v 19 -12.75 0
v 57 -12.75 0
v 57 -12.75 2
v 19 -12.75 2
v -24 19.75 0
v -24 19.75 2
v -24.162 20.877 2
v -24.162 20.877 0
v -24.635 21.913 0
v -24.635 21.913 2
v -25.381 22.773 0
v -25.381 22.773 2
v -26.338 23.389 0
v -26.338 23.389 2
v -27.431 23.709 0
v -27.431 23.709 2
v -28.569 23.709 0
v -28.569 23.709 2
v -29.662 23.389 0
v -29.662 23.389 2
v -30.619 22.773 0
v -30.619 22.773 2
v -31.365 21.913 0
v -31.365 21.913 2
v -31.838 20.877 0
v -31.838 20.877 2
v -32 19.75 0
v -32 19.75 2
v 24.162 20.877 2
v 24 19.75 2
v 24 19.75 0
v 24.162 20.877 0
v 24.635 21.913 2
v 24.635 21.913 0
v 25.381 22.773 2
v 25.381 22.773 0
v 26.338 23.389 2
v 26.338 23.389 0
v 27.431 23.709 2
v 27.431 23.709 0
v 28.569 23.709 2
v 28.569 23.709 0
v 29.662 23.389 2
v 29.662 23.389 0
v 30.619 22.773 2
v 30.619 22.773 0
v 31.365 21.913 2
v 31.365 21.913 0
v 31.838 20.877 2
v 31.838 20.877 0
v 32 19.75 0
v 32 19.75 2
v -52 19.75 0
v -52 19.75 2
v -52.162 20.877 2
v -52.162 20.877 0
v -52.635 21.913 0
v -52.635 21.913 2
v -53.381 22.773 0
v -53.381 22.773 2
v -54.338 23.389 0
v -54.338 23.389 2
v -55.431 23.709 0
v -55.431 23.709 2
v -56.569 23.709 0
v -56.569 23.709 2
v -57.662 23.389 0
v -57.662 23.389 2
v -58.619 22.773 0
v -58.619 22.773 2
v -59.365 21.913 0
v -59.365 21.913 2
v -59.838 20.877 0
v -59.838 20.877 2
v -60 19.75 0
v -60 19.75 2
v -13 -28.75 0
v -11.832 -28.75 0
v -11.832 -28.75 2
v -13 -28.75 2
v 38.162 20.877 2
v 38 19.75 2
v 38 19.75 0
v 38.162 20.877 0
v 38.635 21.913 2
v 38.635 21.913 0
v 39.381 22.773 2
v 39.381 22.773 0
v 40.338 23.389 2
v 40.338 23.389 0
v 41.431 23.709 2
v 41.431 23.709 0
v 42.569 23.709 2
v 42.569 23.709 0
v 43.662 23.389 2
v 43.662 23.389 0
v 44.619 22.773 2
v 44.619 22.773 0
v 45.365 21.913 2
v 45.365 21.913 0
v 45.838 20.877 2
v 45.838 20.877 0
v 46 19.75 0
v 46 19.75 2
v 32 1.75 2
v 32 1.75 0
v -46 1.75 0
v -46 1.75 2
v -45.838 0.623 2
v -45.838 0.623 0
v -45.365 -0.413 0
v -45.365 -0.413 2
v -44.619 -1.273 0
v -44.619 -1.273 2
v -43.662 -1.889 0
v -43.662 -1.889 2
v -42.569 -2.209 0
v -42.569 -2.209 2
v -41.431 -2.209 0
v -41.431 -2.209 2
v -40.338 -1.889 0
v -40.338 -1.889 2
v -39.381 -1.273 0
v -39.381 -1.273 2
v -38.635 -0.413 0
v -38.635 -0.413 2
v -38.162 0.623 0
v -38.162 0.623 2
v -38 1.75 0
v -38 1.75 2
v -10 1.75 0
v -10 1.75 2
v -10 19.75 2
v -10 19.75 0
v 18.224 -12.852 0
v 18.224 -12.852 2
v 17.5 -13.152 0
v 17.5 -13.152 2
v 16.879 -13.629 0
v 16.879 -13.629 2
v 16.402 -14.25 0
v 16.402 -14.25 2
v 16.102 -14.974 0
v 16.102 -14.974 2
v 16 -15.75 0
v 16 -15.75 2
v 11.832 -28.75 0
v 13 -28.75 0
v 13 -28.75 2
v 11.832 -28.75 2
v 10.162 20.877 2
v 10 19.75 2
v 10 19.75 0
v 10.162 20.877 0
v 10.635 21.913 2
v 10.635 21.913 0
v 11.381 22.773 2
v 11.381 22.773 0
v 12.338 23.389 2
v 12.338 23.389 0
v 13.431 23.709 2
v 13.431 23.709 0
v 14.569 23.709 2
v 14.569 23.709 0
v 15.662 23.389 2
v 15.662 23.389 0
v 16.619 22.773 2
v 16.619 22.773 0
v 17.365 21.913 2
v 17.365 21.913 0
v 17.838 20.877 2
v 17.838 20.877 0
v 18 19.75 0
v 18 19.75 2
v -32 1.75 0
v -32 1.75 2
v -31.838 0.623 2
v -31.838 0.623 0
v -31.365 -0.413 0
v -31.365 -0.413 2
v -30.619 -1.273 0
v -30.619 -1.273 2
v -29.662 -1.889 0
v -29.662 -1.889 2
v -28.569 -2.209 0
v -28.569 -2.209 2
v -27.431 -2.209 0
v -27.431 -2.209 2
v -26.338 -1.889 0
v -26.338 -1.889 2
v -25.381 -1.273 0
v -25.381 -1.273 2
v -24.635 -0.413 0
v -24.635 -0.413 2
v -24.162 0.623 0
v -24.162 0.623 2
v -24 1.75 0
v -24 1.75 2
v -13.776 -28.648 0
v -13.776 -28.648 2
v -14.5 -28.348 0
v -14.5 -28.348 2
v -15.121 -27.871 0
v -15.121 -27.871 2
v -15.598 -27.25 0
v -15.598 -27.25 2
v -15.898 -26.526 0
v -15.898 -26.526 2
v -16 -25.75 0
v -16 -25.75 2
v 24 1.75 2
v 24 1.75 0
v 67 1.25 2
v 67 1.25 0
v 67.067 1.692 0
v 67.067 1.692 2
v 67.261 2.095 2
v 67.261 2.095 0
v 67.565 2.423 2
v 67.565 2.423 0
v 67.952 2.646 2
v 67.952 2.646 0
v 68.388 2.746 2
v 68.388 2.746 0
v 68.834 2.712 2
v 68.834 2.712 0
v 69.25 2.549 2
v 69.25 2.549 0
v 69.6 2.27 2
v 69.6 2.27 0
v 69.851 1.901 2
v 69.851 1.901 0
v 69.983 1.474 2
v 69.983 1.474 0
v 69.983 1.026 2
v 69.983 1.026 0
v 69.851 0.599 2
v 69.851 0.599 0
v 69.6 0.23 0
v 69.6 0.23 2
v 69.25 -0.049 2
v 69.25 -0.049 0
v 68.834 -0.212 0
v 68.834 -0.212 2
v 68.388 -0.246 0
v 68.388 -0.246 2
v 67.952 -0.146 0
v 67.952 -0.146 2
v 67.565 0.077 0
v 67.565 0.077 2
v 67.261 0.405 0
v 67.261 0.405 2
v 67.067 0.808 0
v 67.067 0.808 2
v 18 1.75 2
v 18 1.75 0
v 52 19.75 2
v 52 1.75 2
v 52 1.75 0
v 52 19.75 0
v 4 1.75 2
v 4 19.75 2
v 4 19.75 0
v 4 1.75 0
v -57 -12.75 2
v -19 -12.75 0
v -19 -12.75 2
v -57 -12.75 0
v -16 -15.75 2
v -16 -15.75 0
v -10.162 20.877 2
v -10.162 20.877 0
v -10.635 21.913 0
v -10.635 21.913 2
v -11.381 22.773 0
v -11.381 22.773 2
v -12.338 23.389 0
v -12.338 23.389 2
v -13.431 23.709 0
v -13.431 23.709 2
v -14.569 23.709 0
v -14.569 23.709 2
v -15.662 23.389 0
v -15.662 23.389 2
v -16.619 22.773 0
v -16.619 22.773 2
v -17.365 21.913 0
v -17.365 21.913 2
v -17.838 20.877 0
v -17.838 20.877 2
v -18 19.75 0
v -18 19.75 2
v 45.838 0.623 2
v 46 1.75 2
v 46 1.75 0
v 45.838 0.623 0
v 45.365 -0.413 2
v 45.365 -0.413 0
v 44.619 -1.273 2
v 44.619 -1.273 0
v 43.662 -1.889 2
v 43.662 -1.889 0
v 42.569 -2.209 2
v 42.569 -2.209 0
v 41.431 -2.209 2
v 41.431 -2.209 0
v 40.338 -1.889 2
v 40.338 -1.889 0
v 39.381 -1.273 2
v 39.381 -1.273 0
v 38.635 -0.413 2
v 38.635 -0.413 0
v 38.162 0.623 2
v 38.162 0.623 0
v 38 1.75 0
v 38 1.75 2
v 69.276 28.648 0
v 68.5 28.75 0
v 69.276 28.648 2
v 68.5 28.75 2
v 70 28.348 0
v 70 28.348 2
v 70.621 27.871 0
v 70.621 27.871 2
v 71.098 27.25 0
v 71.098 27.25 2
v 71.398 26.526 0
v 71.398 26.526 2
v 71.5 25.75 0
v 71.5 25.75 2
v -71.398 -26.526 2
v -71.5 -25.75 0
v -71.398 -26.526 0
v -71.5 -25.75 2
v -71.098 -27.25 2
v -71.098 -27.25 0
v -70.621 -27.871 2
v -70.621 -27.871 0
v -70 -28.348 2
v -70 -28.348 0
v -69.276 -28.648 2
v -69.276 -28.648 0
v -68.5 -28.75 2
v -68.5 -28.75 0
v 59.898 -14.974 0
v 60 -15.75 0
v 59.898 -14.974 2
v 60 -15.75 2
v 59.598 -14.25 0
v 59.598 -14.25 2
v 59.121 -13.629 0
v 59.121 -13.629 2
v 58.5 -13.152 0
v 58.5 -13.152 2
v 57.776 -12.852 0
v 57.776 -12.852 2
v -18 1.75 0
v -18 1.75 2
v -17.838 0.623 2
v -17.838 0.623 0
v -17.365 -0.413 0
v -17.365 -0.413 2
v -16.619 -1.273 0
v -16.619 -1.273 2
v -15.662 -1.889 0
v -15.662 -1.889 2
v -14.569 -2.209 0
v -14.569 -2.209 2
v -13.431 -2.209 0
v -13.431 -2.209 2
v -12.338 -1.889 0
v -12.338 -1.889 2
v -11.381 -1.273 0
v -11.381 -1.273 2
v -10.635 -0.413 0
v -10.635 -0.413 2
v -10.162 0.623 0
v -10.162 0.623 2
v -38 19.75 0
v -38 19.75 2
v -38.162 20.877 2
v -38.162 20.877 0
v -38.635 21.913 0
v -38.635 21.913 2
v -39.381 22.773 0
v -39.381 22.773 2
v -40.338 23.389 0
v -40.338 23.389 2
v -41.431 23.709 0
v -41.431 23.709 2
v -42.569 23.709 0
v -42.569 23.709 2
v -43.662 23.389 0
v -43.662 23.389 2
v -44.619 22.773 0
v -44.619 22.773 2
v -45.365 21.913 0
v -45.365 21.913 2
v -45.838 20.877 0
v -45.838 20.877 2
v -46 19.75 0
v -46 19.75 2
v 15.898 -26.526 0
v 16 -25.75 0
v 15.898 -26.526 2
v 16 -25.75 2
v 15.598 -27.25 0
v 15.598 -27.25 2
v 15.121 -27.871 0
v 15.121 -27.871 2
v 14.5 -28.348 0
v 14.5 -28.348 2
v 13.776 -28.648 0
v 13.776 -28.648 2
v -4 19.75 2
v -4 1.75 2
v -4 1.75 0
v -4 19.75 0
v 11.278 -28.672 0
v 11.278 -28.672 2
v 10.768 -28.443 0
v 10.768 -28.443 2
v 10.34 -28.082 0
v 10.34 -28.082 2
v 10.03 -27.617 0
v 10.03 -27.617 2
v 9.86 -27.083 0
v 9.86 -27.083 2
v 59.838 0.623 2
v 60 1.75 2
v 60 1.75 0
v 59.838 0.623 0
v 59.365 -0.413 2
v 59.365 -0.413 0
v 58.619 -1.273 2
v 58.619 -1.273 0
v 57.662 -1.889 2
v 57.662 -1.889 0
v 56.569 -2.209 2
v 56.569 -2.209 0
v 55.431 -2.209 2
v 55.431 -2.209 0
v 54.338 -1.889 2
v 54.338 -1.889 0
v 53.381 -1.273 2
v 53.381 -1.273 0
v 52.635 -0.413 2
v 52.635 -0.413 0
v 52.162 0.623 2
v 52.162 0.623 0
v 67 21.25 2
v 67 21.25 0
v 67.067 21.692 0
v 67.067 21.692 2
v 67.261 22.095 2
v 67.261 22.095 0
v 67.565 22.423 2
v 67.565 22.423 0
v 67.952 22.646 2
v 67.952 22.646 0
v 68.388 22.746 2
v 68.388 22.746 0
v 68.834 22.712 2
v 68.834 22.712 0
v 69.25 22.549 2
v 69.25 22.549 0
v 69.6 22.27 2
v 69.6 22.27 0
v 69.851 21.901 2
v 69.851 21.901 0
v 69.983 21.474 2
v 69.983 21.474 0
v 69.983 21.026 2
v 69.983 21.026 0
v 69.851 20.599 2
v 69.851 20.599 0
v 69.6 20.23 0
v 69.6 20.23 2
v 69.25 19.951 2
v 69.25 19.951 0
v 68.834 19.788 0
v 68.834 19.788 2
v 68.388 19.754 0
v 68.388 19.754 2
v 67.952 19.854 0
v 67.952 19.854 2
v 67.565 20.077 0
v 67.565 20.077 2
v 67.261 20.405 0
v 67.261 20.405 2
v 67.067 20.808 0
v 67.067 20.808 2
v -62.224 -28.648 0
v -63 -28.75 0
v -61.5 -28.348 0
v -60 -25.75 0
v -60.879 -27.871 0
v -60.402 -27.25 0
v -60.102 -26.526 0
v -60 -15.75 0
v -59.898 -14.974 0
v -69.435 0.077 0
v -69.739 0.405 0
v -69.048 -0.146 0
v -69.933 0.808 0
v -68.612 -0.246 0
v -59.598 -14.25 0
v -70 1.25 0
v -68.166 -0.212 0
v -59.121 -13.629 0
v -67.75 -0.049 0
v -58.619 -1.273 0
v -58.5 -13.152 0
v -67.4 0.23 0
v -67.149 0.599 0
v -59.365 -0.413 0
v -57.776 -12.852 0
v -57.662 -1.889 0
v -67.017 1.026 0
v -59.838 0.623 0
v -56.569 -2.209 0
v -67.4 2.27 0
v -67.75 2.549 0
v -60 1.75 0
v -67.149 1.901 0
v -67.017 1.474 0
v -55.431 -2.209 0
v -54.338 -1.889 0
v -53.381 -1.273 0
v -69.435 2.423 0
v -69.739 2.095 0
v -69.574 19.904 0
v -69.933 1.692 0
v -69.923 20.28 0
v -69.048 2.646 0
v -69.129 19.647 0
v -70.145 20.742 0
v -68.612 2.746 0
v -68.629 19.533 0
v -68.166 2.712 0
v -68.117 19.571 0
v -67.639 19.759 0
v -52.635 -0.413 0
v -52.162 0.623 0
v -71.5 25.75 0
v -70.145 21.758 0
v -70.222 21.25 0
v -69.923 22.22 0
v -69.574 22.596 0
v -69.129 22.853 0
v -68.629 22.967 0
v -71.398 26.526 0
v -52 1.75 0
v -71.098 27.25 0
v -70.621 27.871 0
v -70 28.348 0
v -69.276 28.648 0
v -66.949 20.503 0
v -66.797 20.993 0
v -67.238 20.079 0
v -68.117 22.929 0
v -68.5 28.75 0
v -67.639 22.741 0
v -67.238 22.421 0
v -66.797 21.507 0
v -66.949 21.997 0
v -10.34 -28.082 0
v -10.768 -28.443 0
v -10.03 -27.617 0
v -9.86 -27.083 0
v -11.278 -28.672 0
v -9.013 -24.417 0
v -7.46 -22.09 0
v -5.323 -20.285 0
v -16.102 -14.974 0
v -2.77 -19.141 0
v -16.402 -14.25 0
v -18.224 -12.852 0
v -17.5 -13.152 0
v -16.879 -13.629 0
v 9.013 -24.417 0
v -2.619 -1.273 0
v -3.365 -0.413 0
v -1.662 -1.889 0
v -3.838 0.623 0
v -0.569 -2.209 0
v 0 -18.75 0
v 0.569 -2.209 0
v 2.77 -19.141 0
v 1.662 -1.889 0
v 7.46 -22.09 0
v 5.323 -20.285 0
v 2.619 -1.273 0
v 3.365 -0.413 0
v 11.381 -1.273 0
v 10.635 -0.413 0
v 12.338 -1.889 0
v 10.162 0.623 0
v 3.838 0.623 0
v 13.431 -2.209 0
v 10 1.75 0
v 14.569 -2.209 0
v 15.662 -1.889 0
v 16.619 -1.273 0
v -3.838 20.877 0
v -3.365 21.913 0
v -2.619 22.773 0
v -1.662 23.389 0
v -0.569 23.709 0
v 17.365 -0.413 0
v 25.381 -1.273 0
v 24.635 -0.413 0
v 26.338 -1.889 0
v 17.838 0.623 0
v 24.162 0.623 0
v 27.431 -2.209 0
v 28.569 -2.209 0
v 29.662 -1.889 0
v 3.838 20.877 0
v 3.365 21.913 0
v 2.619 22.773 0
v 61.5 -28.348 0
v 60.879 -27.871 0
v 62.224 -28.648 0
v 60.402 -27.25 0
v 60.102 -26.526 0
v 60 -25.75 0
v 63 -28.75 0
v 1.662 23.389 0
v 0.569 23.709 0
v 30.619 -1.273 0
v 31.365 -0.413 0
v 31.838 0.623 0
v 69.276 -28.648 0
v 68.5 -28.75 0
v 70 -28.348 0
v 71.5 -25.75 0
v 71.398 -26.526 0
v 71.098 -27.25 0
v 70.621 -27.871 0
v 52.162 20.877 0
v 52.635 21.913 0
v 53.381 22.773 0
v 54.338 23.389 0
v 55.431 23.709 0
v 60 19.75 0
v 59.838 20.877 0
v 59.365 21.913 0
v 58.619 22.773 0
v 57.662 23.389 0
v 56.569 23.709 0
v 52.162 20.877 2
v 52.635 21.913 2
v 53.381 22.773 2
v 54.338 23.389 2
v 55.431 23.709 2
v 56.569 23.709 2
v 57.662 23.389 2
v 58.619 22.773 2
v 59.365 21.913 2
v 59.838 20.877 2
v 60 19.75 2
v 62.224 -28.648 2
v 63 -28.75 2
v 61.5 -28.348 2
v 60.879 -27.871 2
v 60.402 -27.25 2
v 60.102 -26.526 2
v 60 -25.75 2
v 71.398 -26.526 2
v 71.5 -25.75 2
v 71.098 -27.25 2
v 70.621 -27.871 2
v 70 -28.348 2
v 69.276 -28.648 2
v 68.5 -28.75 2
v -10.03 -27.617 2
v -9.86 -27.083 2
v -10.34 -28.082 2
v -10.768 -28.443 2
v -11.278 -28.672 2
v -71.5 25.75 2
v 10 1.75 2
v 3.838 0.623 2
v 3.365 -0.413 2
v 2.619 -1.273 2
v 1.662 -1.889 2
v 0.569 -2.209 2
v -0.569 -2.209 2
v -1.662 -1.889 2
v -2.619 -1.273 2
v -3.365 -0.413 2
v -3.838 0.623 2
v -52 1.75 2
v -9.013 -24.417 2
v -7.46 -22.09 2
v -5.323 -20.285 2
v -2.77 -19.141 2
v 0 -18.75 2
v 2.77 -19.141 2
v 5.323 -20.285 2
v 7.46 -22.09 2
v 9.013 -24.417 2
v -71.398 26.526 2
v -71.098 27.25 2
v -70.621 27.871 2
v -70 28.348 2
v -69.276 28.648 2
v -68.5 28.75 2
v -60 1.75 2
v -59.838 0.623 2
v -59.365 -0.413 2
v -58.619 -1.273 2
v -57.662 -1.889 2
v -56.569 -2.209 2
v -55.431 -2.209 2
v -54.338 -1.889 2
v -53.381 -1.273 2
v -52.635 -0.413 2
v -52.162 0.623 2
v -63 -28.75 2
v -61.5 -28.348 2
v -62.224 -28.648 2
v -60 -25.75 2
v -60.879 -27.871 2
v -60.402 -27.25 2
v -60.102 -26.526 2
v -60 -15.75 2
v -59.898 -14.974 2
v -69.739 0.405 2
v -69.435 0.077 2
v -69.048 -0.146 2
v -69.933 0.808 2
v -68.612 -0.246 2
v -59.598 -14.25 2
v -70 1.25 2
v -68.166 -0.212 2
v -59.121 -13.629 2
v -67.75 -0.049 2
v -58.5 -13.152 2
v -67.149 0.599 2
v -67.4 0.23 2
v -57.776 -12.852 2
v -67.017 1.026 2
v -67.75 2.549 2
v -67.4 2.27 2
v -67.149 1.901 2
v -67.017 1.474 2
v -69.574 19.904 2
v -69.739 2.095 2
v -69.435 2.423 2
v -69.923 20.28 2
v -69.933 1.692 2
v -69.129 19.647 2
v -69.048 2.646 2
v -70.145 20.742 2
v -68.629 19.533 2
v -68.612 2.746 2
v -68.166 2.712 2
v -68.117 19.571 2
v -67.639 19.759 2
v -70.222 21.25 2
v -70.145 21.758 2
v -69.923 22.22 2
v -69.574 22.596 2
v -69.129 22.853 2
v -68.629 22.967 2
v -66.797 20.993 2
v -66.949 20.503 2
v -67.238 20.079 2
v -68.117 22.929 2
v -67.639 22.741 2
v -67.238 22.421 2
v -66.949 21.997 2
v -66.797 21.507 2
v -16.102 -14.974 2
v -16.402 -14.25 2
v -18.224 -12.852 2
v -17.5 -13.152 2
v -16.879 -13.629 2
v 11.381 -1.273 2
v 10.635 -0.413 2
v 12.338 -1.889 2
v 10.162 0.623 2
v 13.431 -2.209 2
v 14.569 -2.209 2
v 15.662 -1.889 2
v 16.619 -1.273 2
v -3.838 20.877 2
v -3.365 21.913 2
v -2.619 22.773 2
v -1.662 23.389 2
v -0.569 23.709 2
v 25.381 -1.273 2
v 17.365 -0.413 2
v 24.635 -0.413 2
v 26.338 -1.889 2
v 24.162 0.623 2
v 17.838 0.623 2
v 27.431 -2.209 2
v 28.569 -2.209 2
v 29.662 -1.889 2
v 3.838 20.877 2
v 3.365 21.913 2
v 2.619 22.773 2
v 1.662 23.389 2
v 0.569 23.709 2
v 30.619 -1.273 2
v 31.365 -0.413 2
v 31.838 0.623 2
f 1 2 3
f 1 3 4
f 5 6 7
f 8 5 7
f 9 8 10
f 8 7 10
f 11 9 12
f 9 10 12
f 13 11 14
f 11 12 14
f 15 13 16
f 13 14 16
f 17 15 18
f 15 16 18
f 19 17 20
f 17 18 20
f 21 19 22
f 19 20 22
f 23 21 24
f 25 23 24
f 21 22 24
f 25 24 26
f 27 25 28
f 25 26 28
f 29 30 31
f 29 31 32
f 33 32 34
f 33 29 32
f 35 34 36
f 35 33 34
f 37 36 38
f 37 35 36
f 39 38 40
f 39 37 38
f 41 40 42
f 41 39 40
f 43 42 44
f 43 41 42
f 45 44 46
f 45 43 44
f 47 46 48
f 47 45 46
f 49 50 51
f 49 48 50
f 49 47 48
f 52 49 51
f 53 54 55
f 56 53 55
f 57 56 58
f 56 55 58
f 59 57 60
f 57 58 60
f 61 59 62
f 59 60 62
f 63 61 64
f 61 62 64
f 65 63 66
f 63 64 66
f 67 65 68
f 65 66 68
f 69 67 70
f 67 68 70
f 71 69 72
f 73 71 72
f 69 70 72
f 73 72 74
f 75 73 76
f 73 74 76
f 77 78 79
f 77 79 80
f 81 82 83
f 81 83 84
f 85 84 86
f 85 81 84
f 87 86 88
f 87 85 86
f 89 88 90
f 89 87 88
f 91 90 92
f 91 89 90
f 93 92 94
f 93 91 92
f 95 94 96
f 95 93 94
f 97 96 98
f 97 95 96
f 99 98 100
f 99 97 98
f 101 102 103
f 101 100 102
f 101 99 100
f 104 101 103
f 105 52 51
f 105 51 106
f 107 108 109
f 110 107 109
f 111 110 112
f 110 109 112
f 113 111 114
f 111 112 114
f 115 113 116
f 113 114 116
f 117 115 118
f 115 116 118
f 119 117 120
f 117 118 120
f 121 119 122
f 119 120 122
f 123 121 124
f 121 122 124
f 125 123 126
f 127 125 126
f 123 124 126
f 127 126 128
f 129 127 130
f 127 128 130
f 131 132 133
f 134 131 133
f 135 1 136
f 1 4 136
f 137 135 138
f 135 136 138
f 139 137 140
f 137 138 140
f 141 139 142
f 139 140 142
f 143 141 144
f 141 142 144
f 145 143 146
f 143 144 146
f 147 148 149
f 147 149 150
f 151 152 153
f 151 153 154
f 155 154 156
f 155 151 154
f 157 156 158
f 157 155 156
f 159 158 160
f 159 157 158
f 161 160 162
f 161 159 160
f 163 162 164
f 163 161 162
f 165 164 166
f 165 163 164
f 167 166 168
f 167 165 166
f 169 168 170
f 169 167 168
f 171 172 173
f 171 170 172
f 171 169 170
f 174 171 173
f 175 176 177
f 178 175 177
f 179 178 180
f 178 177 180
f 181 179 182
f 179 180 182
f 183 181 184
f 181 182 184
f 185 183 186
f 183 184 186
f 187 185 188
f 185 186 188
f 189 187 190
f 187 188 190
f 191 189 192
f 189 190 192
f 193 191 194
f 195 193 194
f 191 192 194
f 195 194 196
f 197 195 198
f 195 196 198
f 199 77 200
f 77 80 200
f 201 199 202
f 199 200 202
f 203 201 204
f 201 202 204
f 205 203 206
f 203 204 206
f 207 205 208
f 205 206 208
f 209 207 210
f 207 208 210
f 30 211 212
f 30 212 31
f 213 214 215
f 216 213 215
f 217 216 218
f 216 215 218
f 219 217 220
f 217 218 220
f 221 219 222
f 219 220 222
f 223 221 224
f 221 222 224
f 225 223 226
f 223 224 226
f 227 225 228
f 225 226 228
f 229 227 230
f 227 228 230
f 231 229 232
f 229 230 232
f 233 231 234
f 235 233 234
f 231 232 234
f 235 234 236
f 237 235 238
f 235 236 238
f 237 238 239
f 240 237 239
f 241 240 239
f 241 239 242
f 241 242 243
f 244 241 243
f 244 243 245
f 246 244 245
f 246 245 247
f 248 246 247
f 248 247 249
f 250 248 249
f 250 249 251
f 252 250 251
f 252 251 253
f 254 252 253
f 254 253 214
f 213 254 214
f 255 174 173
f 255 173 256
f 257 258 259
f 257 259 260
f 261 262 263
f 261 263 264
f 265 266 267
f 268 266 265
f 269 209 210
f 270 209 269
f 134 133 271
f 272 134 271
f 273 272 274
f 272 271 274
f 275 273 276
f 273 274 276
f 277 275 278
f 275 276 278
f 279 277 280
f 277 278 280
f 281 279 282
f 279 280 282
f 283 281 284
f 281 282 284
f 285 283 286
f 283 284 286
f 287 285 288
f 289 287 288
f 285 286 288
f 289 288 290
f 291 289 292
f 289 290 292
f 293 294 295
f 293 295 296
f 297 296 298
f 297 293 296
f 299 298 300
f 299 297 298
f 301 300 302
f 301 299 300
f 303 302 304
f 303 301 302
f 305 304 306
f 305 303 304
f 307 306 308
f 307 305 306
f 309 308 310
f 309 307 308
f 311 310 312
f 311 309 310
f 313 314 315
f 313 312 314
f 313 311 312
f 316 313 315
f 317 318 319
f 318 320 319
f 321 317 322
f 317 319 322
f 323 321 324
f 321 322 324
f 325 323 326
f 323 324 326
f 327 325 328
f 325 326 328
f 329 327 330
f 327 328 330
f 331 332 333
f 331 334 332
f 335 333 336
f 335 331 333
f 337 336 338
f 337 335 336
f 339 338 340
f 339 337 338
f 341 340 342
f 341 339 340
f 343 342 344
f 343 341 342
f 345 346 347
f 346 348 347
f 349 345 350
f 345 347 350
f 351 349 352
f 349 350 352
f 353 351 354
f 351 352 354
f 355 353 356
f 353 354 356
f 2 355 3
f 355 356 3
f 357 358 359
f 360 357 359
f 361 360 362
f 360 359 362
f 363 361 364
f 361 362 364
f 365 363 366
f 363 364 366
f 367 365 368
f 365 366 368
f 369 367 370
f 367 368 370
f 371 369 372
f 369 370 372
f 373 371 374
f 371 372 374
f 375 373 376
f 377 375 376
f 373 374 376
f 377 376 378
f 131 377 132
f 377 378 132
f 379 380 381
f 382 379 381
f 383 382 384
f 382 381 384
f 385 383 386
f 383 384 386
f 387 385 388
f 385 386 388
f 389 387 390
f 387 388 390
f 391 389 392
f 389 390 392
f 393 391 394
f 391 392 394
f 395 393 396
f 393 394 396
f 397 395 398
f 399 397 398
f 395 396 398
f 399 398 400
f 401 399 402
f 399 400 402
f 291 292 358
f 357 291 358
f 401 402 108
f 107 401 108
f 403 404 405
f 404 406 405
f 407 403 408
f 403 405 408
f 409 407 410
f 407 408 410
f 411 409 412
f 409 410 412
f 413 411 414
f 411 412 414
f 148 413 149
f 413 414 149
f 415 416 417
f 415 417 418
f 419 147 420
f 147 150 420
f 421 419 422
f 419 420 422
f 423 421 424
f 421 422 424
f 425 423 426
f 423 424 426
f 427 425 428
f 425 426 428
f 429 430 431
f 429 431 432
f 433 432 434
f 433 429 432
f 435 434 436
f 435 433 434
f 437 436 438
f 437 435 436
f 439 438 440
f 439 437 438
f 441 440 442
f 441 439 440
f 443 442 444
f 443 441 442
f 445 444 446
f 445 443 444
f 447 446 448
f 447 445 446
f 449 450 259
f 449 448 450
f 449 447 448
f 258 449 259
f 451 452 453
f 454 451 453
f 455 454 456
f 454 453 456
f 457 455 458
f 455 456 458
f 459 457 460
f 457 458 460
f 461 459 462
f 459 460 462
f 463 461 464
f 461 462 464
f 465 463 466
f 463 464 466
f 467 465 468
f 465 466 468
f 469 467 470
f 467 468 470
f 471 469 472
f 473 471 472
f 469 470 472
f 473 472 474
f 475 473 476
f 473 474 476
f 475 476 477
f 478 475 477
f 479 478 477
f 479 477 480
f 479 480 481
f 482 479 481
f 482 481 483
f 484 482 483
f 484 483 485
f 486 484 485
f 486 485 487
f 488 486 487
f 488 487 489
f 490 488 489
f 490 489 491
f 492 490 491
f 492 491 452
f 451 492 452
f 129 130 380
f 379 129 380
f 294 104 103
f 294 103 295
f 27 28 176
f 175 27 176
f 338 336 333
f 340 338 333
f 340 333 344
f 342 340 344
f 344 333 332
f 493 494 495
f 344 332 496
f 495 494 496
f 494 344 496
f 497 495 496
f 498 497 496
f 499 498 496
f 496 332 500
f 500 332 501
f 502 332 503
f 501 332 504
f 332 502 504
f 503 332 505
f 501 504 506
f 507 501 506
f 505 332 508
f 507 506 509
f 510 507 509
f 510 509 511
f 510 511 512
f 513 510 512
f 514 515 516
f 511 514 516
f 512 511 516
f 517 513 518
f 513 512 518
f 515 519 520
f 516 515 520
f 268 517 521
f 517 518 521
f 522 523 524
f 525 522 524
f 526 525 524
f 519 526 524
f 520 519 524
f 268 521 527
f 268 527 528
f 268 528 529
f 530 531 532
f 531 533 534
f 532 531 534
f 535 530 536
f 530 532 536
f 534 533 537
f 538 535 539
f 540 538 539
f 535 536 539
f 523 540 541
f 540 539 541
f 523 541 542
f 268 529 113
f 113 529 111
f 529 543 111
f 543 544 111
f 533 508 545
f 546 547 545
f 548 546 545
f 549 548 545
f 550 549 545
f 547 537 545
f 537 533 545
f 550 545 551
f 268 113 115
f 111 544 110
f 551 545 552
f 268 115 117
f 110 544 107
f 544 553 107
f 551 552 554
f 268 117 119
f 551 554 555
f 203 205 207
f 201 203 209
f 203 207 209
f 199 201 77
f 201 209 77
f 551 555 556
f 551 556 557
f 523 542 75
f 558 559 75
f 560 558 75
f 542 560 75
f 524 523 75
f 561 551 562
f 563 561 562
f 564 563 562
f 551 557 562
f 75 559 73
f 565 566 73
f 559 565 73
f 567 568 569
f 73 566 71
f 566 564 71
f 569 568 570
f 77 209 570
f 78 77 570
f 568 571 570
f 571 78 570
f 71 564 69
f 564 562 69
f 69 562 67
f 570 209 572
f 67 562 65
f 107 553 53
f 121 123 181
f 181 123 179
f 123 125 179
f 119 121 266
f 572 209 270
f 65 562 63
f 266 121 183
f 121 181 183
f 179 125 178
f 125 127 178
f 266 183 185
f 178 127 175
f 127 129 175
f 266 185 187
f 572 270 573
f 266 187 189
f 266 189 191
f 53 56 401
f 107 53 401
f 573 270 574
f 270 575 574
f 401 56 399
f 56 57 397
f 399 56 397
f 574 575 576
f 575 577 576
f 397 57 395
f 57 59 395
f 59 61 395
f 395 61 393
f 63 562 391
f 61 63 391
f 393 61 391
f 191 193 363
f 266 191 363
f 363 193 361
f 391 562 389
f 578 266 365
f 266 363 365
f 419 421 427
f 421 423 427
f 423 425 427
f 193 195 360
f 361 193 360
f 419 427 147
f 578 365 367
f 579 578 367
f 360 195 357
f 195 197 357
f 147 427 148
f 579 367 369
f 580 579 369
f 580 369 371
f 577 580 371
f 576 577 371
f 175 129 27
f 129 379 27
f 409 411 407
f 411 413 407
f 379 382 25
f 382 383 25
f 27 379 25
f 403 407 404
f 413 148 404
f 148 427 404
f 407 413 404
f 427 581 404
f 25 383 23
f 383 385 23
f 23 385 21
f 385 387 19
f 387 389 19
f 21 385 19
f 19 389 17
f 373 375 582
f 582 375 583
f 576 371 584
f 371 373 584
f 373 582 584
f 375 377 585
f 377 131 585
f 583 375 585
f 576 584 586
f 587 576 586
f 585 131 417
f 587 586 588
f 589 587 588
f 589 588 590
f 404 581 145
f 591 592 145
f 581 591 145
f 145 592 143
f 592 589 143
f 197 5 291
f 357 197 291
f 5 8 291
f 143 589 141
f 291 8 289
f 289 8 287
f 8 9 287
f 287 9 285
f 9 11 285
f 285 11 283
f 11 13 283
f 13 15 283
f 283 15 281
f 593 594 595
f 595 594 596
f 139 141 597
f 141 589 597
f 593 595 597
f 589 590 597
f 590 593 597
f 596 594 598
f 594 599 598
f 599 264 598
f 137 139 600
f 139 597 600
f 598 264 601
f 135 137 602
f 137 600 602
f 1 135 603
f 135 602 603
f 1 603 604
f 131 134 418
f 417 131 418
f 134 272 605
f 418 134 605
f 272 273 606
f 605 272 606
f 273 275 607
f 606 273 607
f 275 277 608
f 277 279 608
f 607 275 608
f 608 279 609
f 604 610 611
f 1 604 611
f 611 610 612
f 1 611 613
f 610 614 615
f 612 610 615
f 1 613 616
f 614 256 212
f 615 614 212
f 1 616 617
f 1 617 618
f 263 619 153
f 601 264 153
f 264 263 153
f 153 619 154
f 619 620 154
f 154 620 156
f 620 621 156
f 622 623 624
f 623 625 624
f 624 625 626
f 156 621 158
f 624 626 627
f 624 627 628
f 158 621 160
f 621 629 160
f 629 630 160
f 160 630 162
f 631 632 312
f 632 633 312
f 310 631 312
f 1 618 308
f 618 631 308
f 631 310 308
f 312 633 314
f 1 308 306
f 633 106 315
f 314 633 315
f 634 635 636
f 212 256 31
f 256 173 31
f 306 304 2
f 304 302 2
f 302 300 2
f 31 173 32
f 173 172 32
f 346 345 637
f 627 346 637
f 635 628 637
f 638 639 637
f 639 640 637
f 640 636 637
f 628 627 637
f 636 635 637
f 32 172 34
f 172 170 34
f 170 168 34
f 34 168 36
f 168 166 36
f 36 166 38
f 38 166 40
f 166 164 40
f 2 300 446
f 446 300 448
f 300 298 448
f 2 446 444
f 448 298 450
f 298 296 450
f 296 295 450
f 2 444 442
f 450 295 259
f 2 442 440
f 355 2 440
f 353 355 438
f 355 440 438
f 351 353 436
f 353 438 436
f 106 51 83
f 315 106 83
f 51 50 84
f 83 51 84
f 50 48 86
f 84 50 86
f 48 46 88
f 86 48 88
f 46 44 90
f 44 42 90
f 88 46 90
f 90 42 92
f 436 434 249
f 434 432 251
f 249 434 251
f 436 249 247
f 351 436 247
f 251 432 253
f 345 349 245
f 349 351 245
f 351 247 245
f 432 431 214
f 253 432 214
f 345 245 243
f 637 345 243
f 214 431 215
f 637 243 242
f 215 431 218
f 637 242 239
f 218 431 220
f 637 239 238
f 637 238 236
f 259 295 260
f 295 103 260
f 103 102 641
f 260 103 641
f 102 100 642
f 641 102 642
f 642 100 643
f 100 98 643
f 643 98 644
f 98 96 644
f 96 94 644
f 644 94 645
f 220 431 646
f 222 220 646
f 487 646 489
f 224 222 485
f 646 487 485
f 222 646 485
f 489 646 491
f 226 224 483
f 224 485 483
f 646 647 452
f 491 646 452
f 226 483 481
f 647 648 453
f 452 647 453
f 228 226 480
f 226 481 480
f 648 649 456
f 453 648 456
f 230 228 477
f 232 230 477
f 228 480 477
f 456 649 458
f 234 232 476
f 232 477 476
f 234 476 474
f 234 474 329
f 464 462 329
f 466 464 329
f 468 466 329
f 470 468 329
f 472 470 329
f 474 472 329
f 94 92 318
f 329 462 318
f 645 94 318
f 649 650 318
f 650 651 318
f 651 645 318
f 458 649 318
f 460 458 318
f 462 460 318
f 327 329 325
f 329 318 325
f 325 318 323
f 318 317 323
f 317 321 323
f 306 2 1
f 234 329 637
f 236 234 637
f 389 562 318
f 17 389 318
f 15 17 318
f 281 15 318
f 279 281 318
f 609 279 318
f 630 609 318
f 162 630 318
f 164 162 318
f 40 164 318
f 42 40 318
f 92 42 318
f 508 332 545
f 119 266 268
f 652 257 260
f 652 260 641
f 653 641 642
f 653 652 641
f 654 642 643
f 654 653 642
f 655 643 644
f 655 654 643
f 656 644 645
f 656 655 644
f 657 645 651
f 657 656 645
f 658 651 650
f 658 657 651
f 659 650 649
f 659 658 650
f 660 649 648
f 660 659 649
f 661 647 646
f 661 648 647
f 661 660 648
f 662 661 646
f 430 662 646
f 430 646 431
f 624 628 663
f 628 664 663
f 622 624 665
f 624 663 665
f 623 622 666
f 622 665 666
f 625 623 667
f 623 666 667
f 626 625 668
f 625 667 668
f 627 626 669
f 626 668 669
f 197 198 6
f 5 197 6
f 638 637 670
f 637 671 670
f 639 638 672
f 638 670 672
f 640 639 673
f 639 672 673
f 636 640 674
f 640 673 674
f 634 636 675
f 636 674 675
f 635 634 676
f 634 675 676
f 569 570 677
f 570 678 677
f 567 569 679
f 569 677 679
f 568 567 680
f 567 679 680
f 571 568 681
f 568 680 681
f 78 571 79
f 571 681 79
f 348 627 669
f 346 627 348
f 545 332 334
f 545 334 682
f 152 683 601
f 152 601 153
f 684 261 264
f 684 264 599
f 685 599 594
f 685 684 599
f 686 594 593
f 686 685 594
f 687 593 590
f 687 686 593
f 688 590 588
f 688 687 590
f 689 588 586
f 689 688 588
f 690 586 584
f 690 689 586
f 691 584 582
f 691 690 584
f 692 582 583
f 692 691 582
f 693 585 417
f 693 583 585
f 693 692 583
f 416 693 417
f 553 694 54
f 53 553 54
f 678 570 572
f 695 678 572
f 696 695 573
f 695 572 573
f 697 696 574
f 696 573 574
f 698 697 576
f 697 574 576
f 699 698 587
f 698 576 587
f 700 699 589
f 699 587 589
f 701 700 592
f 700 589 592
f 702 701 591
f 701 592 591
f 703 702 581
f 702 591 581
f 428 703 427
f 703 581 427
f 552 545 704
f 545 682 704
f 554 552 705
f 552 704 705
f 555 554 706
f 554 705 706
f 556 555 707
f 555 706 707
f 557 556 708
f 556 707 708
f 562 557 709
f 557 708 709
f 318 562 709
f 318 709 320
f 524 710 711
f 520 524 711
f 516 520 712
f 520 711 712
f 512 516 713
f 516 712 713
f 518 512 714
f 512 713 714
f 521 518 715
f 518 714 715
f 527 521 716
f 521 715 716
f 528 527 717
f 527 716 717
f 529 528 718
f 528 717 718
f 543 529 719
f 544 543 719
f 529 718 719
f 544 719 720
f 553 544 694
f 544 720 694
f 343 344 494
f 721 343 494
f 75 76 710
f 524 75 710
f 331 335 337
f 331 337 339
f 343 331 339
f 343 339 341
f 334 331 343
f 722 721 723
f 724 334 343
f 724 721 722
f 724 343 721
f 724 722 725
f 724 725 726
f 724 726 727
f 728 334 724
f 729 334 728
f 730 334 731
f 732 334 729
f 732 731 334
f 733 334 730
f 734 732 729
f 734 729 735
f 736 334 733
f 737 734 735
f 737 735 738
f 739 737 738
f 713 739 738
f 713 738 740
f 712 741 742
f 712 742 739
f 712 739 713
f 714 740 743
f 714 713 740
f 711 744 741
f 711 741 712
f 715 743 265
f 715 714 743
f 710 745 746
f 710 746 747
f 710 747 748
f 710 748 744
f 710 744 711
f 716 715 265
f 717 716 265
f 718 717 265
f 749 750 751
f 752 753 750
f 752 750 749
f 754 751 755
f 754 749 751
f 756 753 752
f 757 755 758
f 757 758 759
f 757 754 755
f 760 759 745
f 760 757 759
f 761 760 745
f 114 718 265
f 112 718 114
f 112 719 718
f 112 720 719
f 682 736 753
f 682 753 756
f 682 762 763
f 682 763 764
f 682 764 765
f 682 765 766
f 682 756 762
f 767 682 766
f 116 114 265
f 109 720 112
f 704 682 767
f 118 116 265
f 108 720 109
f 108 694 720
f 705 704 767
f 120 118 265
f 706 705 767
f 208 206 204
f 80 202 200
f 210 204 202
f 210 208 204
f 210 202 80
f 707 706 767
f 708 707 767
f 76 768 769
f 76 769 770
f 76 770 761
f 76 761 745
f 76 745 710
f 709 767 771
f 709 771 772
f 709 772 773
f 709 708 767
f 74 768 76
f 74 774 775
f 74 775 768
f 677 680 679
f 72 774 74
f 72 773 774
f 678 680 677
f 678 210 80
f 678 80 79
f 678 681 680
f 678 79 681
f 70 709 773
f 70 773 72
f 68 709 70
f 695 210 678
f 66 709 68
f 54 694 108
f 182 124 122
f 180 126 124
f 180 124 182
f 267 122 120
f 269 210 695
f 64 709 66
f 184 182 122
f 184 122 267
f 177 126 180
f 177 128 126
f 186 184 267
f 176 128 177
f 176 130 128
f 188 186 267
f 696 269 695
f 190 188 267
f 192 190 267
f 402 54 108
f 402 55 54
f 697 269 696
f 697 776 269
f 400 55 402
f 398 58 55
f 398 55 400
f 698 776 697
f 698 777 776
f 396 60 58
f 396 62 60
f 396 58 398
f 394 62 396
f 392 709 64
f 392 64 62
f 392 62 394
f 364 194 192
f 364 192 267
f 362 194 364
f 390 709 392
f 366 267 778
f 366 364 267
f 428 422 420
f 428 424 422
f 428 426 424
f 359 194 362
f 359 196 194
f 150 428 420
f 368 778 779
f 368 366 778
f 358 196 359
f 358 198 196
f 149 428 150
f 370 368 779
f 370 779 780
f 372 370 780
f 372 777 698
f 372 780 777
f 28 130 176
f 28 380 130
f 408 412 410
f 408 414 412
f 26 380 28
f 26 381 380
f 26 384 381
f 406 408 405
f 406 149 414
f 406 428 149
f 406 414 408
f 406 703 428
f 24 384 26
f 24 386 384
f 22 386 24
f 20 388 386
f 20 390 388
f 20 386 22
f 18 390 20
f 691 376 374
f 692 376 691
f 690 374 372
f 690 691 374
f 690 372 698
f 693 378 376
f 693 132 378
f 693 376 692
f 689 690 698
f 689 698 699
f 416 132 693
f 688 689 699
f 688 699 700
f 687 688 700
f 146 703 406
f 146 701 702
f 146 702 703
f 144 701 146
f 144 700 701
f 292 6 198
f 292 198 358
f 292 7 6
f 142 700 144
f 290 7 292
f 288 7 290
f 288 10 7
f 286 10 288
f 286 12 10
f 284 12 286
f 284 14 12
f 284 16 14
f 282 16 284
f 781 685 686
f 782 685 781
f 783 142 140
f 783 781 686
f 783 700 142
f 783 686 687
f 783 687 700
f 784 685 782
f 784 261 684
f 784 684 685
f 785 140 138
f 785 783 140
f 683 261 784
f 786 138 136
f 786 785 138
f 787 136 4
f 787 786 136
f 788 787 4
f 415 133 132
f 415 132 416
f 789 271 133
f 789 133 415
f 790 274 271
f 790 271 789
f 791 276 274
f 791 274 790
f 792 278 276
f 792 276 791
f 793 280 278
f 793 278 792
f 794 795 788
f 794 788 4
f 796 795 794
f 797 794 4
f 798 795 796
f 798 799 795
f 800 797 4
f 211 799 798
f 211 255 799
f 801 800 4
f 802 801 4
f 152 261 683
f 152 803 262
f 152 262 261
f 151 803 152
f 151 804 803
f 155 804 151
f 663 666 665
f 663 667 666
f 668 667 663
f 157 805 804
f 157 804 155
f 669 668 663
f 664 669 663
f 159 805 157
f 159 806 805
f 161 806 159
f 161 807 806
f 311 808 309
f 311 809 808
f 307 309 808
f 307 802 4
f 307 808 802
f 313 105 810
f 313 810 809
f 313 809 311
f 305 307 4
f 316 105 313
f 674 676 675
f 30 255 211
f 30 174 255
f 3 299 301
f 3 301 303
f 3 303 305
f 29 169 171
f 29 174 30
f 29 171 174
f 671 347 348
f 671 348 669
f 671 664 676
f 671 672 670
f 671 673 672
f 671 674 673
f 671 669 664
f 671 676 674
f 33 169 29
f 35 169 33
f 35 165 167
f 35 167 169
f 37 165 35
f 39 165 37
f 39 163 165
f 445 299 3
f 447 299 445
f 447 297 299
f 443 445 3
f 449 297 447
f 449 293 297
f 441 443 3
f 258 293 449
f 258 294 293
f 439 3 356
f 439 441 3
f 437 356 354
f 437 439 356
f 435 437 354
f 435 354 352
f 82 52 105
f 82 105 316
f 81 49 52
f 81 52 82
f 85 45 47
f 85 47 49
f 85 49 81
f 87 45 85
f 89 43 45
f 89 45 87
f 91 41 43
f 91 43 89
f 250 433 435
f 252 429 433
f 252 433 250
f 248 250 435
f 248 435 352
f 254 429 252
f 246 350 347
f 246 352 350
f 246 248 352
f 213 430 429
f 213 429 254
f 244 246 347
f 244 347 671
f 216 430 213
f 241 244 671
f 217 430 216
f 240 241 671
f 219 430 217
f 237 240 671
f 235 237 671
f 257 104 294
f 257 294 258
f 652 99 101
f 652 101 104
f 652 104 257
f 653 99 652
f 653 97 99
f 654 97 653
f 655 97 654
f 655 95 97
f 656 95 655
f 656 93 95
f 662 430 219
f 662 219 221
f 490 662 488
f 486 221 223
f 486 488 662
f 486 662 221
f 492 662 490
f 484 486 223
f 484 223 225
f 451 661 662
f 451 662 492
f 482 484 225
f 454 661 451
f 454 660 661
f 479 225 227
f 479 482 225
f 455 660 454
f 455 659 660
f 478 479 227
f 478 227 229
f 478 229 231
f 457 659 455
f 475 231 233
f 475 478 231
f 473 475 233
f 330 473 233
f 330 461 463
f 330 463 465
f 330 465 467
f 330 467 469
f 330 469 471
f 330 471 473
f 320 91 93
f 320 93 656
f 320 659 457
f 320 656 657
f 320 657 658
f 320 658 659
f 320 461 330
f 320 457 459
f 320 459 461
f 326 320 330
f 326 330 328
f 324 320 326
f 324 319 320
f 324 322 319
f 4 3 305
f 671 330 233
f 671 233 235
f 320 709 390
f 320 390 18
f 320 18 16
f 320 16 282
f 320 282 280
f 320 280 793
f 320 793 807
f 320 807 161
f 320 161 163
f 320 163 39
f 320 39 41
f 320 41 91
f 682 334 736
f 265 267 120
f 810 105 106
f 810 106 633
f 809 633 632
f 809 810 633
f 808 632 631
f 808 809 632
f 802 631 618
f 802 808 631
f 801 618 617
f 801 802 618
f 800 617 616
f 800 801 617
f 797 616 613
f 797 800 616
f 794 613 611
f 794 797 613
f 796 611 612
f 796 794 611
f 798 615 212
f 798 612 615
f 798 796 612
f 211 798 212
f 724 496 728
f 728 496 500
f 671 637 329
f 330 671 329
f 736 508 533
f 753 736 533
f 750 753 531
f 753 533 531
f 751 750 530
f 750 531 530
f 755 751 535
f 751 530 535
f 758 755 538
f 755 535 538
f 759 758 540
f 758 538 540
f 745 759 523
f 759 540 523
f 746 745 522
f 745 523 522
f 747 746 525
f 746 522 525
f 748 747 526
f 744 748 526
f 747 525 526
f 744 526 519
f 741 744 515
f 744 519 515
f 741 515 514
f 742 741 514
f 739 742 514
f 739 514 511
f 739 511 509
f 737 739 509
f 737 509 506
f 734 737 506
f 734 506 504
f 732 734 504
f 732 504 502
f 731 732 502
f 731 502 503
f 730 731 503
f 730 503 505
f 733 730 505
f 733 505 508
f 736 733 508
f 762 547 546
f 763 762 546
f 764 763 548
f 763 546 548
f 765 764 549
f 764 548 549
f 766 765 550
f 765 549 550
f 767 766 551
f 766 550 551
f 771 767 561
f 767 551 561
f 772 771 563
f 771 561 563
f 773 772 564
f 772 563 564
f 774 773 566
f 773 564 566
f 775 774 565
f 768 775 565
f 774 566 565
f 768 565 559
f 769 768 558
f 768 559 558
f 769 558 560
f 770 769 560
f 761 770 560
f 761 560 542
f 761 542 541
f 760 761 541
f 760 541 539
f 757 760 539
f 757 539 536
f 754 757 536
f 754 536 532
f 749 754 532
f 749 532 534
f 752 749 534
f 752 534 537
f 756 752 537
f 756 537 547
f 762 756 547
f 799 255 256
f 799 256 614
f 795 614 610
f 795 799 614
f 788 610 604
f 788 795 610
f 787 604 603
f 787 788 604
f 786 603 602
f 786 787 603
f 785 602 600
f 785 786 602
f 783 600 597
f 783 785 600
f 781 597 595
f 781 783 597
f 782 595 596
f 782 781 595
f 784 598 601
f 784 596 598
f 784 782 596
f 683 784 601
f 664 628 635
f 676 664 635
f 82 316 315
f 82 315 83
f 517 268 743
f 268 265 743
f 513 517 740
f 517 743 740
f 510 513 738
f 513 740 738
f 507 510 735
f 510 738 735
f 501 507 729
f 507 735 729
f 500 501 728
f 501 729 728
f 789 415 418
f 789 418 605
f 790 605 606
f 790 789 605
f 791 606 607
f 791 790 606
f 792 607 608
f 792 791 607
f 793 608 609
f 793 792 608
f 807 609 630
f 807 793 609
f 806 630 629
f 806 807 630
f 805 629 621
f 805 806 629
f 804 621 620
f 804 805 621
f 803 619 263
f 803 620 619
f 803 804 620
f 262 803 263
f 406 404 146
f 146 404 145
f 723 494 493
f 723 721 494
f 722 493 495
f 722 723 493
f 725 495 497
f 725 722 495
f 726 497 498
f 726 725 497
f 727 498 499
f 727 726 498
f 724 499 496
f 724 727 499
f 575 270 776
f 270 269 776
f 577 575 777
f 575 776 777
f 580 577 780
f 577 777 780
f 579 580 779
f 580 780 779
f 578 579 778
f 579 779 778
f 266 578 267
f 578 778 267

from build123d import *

# Parameters (mm, degrees)
SKETCH_1_W          = 143
SKETCH_1_H          = 57.5
EXTRUDE_1_DEPTH     = 2
SKETCH_4_W          = 120
SKETCH_4_H          = 16
CUT_EXTRUDE_1_DEPTH = 10
FILLET_1_R          = 3
CUT_EXTRUDE_2_DEPTH = 10
SKETCH_6_W          = 32
SKETCH_6_H          = 16
EXTRUDE_2_DEPTH     = 2
CUT_EXTRUDE_3_DEPTH = 2
FILLET_2_R          = 3
FILLET_3_R          = 2
SKETCH_8_R          = 1.5
CUT_EXTRUDE_4_DEPTH = 78.089639382
SKETCH_10_R         = 1.721982437
CUT_EXTRUDE_5_DEPTH = 78.089639382
SKETCH_12_R         = 1.5
CUT_EXTRUDE_6_DEPTH = 78.089639382


with BuildPart() as part:
    # 草图1 → 凸台-拉伸1 (new body)
    with BuildSketch(Plane.XY):
        Rectangle(SKETCH_1_W, SKETCH_1_H)
    extrude(amount=EXTRUDE_1_DEPTH)

    # 草图4 → 切除-拉伸1 (cut)
    with BuildSketch(Plane(origin=(0, 0, 0), x_dir=(-1, 0, 0), z_dir=(0, 0, -1))):
        with Locations((0, -20.75)):
            Rectangle(SKETCH_4_W, SKETCH_4_H)
    extrude(amount=-CUT_EXTRUDE_1_DEPTH, mode=Mode.SUBTRACT)

    # 圆角1
    fillet_1_edges = [part.edges().sort_by_distance(p)[0] for p in [
        (-60, -28.75, 1),
        (60, -28.75, 1),
        (-71.5, 28.75, 1),
        (71.5, 28.75, 1),
        (71.5, -28.75, 1),
        (-71.5, -28.75, 1),
    ]]
    fillet(fillet_1_edges, radius=FILLET_1_R)

    # 草图5 → 切除-拉伸2 (cut)
    with BuildSketch(Plane.XY.offset(2)):
        with BuildLine():
            Line((4, 19.75), (4, 1.75))
            ThreePointArc((4, 1.75), (0, -2.25), (-4, 1.75))
            Line((-4, 1.75), (-4, 19.75))
            ThreePointArc((-4, 19.75), (0, 23.75), (4, 19.75))
        make_face()
        with BuildLine():
            Line((18, 19.75), (18, 1.75))
            ThreePointArc((18, 1.75), (14, -2.25), (10, 1.75))
            Line((10, 1.75), (10, 19.75))
            ThreePointArc((10, 19.75), (14, 23.75), (18, 19.75))
        make_face()
        with BuildLine():
            Line((32, 19.75), (32, 1.75))
            ThreePointArc((32, 1.75), (28, -2.25), (24, 1.75))
            Line((24, 1.75), (24, 19.75))
            ThreePointArc((24, 19.75), (28, 23.75), (32, 19.75))
        make_face()
        with BuildLine():
            Line((46, 19.75), (46, 1.75))
            ThreePointArc((46, 1.75), (42, -2.25), (38, 1.75))
            Line((38, 1.75), (38, 19.75))
            ThreePointArc((38, 19.75), (42, 23.75), (46, 19.75))
        make_face()
        with BuildLine():
            Line((60, 19.75), (60, 1.75))
            ThreePointArc((60, 1.75), (56, -2.25), (52, 1.75))
            Line((52, 1.75), (52, 19.75))
            ThreePointArc((52, 19.75), (56, 23.75), (60, 19.75))
        make_face()
        with BuildLine():
            Line((-60, 19.75), (-60, 1.75))
            ThreePointArc((-60, 1.75), (-56, -2.25), (-52, 1.75))
            Line((-52, 1.75), (-52, 19.75))
            ThreePointArc((-52, 19.75), (-56, 23.75), (-60, 19.75))
        make_face()
        with BuildLine():
            Line((-46, 19.75), (-46, 1.75))
            ThreePointArc((-46, 1.75), (-42, -2.25), (-38, 1.75))
            Line((-38, 1.75), (-38, 19.75))
            ThreePointArc((-38, 19.75), (-42, 23.75), (-46, 19.75))
        make_face()
        with BuildLine():
            Line((-32, 19.75), (-32, 1.75))
            ThreePointArc((-32, 1.75), (-28, -2.25), (-24, 1.75))
            Line((-24, 1.75), (-24, 19.75))
            ThreePointArc((-24, 19.75), (-28, 23.75), (-32, 19.75))
        make_face()
        with BuildLine():
            Line((-18, 19.75), (-18, 1.75))
            ThreePointArc((-18, 1.75), (-14, -2.25), (-10, 1.75))
            Line((-10, 1.75), (-10, 19.75))
            ThreePointArc((-10, 19.75), (-14, 23.75), (-18, 19.75))
        make_face()
    extrude(amount=-CUT_EXTRUDE_2_DEPTH, mode=Mode.SUBTRACT)

    # 草图6 → 凸台-拉伸2 (add)
    with BuildSketch(Plane(origin=(0, 0, 0), x_dir=(-1, 0, 0), z_dir=(0, 0, -1))):
        with Locations((0, -20.75)):
            Rectangle(SKETCH_6_W, SKETCH_6_H)
    extrude(amount=-EXTRUDE_2_DEPTH)

    # 草图7 → 切除-拉伸3 (cut)
    with BuildSketch(Plane(origin=(0, 0, 0), x_dir=(-1, 0, 0), z_dir=(0, 0, -1))):
        with BuildLine():
            Line((-10, -28.75), (10, -28.75))
            ThreePointArc((10, -28.75), (0, -18.75), (-10, -28.75))
        make_face()
    extrude(amount=-CUT_EXTRUDE_3_DEPTH, mode=Mode.SUBTRACT)

    # 圆角2
    fillet_2_edges = [part.edges().sort_by_distance(p)[0] for p in [
        (-60, -12.75, 1),
        (60, -12.75, 1),
        (-16, -12.75, 1),
        (-16, -28.75, 1),
        (16, -28.75, 1),
        (16, -12.75, 1),
    ]]
    fillet(fillet_2_edges, radius=FILLET_2_R)

    # 圆角3
    fillet_3_edges = [part.edges().sort_by_distance(p)[0] for p in [
        (10, -28.75, 1),
        (-10, -28.75, 1),
    ]]
    fillet(fillet_3_edges, radius=FILLET_3_R)

    # 草图8 → 切除-拉伸4 (cut, through all)
    with BuildSketch(Plane(origin=(0, 0, 0), x_dir=(-1, 0, 0), z_dir=(0, 0, -1))):
        with Locations((-68.5, 1.25)):
            Circle(SKETCH_8_R)
        with Locations((-68.5, 21.25)):
            Circle(SKETCH_8_R)
    extrude(amount=-CUT_EXTRUDE_4_DEPTH, mode=Mode.SUBTRACT)

    # 草图10 → 切除-拉伸5 (cut, through all)
    with BuildSketch(Plane(origin=(0, 0, 0), x_dir=(-1, 0, 0), z_dir=(0, 0, -1))):
        with Locations((68.5, 21.25)):
            Circle(SKETCH_10_R)
    extrude(amount=-CUT_EXTRUDE_5_DEPTH, mode=Mode.SUBTRACT)

    # 草图12 → 切除-拉伸6 (cut, through all)
    with BuildSketch(Plane(origin=(0, 0, 0), x_dir=(-1, 0, 0), z_dir=(0, 0, -1))):
        with Locations((68.5, 1.25)):
            Circle(SKETCH_12_R)
    extrude(amount=-CUT_EXTRUDE_6_DEPTH, mode=Mode.SUBTRACT)


solid = part.part
